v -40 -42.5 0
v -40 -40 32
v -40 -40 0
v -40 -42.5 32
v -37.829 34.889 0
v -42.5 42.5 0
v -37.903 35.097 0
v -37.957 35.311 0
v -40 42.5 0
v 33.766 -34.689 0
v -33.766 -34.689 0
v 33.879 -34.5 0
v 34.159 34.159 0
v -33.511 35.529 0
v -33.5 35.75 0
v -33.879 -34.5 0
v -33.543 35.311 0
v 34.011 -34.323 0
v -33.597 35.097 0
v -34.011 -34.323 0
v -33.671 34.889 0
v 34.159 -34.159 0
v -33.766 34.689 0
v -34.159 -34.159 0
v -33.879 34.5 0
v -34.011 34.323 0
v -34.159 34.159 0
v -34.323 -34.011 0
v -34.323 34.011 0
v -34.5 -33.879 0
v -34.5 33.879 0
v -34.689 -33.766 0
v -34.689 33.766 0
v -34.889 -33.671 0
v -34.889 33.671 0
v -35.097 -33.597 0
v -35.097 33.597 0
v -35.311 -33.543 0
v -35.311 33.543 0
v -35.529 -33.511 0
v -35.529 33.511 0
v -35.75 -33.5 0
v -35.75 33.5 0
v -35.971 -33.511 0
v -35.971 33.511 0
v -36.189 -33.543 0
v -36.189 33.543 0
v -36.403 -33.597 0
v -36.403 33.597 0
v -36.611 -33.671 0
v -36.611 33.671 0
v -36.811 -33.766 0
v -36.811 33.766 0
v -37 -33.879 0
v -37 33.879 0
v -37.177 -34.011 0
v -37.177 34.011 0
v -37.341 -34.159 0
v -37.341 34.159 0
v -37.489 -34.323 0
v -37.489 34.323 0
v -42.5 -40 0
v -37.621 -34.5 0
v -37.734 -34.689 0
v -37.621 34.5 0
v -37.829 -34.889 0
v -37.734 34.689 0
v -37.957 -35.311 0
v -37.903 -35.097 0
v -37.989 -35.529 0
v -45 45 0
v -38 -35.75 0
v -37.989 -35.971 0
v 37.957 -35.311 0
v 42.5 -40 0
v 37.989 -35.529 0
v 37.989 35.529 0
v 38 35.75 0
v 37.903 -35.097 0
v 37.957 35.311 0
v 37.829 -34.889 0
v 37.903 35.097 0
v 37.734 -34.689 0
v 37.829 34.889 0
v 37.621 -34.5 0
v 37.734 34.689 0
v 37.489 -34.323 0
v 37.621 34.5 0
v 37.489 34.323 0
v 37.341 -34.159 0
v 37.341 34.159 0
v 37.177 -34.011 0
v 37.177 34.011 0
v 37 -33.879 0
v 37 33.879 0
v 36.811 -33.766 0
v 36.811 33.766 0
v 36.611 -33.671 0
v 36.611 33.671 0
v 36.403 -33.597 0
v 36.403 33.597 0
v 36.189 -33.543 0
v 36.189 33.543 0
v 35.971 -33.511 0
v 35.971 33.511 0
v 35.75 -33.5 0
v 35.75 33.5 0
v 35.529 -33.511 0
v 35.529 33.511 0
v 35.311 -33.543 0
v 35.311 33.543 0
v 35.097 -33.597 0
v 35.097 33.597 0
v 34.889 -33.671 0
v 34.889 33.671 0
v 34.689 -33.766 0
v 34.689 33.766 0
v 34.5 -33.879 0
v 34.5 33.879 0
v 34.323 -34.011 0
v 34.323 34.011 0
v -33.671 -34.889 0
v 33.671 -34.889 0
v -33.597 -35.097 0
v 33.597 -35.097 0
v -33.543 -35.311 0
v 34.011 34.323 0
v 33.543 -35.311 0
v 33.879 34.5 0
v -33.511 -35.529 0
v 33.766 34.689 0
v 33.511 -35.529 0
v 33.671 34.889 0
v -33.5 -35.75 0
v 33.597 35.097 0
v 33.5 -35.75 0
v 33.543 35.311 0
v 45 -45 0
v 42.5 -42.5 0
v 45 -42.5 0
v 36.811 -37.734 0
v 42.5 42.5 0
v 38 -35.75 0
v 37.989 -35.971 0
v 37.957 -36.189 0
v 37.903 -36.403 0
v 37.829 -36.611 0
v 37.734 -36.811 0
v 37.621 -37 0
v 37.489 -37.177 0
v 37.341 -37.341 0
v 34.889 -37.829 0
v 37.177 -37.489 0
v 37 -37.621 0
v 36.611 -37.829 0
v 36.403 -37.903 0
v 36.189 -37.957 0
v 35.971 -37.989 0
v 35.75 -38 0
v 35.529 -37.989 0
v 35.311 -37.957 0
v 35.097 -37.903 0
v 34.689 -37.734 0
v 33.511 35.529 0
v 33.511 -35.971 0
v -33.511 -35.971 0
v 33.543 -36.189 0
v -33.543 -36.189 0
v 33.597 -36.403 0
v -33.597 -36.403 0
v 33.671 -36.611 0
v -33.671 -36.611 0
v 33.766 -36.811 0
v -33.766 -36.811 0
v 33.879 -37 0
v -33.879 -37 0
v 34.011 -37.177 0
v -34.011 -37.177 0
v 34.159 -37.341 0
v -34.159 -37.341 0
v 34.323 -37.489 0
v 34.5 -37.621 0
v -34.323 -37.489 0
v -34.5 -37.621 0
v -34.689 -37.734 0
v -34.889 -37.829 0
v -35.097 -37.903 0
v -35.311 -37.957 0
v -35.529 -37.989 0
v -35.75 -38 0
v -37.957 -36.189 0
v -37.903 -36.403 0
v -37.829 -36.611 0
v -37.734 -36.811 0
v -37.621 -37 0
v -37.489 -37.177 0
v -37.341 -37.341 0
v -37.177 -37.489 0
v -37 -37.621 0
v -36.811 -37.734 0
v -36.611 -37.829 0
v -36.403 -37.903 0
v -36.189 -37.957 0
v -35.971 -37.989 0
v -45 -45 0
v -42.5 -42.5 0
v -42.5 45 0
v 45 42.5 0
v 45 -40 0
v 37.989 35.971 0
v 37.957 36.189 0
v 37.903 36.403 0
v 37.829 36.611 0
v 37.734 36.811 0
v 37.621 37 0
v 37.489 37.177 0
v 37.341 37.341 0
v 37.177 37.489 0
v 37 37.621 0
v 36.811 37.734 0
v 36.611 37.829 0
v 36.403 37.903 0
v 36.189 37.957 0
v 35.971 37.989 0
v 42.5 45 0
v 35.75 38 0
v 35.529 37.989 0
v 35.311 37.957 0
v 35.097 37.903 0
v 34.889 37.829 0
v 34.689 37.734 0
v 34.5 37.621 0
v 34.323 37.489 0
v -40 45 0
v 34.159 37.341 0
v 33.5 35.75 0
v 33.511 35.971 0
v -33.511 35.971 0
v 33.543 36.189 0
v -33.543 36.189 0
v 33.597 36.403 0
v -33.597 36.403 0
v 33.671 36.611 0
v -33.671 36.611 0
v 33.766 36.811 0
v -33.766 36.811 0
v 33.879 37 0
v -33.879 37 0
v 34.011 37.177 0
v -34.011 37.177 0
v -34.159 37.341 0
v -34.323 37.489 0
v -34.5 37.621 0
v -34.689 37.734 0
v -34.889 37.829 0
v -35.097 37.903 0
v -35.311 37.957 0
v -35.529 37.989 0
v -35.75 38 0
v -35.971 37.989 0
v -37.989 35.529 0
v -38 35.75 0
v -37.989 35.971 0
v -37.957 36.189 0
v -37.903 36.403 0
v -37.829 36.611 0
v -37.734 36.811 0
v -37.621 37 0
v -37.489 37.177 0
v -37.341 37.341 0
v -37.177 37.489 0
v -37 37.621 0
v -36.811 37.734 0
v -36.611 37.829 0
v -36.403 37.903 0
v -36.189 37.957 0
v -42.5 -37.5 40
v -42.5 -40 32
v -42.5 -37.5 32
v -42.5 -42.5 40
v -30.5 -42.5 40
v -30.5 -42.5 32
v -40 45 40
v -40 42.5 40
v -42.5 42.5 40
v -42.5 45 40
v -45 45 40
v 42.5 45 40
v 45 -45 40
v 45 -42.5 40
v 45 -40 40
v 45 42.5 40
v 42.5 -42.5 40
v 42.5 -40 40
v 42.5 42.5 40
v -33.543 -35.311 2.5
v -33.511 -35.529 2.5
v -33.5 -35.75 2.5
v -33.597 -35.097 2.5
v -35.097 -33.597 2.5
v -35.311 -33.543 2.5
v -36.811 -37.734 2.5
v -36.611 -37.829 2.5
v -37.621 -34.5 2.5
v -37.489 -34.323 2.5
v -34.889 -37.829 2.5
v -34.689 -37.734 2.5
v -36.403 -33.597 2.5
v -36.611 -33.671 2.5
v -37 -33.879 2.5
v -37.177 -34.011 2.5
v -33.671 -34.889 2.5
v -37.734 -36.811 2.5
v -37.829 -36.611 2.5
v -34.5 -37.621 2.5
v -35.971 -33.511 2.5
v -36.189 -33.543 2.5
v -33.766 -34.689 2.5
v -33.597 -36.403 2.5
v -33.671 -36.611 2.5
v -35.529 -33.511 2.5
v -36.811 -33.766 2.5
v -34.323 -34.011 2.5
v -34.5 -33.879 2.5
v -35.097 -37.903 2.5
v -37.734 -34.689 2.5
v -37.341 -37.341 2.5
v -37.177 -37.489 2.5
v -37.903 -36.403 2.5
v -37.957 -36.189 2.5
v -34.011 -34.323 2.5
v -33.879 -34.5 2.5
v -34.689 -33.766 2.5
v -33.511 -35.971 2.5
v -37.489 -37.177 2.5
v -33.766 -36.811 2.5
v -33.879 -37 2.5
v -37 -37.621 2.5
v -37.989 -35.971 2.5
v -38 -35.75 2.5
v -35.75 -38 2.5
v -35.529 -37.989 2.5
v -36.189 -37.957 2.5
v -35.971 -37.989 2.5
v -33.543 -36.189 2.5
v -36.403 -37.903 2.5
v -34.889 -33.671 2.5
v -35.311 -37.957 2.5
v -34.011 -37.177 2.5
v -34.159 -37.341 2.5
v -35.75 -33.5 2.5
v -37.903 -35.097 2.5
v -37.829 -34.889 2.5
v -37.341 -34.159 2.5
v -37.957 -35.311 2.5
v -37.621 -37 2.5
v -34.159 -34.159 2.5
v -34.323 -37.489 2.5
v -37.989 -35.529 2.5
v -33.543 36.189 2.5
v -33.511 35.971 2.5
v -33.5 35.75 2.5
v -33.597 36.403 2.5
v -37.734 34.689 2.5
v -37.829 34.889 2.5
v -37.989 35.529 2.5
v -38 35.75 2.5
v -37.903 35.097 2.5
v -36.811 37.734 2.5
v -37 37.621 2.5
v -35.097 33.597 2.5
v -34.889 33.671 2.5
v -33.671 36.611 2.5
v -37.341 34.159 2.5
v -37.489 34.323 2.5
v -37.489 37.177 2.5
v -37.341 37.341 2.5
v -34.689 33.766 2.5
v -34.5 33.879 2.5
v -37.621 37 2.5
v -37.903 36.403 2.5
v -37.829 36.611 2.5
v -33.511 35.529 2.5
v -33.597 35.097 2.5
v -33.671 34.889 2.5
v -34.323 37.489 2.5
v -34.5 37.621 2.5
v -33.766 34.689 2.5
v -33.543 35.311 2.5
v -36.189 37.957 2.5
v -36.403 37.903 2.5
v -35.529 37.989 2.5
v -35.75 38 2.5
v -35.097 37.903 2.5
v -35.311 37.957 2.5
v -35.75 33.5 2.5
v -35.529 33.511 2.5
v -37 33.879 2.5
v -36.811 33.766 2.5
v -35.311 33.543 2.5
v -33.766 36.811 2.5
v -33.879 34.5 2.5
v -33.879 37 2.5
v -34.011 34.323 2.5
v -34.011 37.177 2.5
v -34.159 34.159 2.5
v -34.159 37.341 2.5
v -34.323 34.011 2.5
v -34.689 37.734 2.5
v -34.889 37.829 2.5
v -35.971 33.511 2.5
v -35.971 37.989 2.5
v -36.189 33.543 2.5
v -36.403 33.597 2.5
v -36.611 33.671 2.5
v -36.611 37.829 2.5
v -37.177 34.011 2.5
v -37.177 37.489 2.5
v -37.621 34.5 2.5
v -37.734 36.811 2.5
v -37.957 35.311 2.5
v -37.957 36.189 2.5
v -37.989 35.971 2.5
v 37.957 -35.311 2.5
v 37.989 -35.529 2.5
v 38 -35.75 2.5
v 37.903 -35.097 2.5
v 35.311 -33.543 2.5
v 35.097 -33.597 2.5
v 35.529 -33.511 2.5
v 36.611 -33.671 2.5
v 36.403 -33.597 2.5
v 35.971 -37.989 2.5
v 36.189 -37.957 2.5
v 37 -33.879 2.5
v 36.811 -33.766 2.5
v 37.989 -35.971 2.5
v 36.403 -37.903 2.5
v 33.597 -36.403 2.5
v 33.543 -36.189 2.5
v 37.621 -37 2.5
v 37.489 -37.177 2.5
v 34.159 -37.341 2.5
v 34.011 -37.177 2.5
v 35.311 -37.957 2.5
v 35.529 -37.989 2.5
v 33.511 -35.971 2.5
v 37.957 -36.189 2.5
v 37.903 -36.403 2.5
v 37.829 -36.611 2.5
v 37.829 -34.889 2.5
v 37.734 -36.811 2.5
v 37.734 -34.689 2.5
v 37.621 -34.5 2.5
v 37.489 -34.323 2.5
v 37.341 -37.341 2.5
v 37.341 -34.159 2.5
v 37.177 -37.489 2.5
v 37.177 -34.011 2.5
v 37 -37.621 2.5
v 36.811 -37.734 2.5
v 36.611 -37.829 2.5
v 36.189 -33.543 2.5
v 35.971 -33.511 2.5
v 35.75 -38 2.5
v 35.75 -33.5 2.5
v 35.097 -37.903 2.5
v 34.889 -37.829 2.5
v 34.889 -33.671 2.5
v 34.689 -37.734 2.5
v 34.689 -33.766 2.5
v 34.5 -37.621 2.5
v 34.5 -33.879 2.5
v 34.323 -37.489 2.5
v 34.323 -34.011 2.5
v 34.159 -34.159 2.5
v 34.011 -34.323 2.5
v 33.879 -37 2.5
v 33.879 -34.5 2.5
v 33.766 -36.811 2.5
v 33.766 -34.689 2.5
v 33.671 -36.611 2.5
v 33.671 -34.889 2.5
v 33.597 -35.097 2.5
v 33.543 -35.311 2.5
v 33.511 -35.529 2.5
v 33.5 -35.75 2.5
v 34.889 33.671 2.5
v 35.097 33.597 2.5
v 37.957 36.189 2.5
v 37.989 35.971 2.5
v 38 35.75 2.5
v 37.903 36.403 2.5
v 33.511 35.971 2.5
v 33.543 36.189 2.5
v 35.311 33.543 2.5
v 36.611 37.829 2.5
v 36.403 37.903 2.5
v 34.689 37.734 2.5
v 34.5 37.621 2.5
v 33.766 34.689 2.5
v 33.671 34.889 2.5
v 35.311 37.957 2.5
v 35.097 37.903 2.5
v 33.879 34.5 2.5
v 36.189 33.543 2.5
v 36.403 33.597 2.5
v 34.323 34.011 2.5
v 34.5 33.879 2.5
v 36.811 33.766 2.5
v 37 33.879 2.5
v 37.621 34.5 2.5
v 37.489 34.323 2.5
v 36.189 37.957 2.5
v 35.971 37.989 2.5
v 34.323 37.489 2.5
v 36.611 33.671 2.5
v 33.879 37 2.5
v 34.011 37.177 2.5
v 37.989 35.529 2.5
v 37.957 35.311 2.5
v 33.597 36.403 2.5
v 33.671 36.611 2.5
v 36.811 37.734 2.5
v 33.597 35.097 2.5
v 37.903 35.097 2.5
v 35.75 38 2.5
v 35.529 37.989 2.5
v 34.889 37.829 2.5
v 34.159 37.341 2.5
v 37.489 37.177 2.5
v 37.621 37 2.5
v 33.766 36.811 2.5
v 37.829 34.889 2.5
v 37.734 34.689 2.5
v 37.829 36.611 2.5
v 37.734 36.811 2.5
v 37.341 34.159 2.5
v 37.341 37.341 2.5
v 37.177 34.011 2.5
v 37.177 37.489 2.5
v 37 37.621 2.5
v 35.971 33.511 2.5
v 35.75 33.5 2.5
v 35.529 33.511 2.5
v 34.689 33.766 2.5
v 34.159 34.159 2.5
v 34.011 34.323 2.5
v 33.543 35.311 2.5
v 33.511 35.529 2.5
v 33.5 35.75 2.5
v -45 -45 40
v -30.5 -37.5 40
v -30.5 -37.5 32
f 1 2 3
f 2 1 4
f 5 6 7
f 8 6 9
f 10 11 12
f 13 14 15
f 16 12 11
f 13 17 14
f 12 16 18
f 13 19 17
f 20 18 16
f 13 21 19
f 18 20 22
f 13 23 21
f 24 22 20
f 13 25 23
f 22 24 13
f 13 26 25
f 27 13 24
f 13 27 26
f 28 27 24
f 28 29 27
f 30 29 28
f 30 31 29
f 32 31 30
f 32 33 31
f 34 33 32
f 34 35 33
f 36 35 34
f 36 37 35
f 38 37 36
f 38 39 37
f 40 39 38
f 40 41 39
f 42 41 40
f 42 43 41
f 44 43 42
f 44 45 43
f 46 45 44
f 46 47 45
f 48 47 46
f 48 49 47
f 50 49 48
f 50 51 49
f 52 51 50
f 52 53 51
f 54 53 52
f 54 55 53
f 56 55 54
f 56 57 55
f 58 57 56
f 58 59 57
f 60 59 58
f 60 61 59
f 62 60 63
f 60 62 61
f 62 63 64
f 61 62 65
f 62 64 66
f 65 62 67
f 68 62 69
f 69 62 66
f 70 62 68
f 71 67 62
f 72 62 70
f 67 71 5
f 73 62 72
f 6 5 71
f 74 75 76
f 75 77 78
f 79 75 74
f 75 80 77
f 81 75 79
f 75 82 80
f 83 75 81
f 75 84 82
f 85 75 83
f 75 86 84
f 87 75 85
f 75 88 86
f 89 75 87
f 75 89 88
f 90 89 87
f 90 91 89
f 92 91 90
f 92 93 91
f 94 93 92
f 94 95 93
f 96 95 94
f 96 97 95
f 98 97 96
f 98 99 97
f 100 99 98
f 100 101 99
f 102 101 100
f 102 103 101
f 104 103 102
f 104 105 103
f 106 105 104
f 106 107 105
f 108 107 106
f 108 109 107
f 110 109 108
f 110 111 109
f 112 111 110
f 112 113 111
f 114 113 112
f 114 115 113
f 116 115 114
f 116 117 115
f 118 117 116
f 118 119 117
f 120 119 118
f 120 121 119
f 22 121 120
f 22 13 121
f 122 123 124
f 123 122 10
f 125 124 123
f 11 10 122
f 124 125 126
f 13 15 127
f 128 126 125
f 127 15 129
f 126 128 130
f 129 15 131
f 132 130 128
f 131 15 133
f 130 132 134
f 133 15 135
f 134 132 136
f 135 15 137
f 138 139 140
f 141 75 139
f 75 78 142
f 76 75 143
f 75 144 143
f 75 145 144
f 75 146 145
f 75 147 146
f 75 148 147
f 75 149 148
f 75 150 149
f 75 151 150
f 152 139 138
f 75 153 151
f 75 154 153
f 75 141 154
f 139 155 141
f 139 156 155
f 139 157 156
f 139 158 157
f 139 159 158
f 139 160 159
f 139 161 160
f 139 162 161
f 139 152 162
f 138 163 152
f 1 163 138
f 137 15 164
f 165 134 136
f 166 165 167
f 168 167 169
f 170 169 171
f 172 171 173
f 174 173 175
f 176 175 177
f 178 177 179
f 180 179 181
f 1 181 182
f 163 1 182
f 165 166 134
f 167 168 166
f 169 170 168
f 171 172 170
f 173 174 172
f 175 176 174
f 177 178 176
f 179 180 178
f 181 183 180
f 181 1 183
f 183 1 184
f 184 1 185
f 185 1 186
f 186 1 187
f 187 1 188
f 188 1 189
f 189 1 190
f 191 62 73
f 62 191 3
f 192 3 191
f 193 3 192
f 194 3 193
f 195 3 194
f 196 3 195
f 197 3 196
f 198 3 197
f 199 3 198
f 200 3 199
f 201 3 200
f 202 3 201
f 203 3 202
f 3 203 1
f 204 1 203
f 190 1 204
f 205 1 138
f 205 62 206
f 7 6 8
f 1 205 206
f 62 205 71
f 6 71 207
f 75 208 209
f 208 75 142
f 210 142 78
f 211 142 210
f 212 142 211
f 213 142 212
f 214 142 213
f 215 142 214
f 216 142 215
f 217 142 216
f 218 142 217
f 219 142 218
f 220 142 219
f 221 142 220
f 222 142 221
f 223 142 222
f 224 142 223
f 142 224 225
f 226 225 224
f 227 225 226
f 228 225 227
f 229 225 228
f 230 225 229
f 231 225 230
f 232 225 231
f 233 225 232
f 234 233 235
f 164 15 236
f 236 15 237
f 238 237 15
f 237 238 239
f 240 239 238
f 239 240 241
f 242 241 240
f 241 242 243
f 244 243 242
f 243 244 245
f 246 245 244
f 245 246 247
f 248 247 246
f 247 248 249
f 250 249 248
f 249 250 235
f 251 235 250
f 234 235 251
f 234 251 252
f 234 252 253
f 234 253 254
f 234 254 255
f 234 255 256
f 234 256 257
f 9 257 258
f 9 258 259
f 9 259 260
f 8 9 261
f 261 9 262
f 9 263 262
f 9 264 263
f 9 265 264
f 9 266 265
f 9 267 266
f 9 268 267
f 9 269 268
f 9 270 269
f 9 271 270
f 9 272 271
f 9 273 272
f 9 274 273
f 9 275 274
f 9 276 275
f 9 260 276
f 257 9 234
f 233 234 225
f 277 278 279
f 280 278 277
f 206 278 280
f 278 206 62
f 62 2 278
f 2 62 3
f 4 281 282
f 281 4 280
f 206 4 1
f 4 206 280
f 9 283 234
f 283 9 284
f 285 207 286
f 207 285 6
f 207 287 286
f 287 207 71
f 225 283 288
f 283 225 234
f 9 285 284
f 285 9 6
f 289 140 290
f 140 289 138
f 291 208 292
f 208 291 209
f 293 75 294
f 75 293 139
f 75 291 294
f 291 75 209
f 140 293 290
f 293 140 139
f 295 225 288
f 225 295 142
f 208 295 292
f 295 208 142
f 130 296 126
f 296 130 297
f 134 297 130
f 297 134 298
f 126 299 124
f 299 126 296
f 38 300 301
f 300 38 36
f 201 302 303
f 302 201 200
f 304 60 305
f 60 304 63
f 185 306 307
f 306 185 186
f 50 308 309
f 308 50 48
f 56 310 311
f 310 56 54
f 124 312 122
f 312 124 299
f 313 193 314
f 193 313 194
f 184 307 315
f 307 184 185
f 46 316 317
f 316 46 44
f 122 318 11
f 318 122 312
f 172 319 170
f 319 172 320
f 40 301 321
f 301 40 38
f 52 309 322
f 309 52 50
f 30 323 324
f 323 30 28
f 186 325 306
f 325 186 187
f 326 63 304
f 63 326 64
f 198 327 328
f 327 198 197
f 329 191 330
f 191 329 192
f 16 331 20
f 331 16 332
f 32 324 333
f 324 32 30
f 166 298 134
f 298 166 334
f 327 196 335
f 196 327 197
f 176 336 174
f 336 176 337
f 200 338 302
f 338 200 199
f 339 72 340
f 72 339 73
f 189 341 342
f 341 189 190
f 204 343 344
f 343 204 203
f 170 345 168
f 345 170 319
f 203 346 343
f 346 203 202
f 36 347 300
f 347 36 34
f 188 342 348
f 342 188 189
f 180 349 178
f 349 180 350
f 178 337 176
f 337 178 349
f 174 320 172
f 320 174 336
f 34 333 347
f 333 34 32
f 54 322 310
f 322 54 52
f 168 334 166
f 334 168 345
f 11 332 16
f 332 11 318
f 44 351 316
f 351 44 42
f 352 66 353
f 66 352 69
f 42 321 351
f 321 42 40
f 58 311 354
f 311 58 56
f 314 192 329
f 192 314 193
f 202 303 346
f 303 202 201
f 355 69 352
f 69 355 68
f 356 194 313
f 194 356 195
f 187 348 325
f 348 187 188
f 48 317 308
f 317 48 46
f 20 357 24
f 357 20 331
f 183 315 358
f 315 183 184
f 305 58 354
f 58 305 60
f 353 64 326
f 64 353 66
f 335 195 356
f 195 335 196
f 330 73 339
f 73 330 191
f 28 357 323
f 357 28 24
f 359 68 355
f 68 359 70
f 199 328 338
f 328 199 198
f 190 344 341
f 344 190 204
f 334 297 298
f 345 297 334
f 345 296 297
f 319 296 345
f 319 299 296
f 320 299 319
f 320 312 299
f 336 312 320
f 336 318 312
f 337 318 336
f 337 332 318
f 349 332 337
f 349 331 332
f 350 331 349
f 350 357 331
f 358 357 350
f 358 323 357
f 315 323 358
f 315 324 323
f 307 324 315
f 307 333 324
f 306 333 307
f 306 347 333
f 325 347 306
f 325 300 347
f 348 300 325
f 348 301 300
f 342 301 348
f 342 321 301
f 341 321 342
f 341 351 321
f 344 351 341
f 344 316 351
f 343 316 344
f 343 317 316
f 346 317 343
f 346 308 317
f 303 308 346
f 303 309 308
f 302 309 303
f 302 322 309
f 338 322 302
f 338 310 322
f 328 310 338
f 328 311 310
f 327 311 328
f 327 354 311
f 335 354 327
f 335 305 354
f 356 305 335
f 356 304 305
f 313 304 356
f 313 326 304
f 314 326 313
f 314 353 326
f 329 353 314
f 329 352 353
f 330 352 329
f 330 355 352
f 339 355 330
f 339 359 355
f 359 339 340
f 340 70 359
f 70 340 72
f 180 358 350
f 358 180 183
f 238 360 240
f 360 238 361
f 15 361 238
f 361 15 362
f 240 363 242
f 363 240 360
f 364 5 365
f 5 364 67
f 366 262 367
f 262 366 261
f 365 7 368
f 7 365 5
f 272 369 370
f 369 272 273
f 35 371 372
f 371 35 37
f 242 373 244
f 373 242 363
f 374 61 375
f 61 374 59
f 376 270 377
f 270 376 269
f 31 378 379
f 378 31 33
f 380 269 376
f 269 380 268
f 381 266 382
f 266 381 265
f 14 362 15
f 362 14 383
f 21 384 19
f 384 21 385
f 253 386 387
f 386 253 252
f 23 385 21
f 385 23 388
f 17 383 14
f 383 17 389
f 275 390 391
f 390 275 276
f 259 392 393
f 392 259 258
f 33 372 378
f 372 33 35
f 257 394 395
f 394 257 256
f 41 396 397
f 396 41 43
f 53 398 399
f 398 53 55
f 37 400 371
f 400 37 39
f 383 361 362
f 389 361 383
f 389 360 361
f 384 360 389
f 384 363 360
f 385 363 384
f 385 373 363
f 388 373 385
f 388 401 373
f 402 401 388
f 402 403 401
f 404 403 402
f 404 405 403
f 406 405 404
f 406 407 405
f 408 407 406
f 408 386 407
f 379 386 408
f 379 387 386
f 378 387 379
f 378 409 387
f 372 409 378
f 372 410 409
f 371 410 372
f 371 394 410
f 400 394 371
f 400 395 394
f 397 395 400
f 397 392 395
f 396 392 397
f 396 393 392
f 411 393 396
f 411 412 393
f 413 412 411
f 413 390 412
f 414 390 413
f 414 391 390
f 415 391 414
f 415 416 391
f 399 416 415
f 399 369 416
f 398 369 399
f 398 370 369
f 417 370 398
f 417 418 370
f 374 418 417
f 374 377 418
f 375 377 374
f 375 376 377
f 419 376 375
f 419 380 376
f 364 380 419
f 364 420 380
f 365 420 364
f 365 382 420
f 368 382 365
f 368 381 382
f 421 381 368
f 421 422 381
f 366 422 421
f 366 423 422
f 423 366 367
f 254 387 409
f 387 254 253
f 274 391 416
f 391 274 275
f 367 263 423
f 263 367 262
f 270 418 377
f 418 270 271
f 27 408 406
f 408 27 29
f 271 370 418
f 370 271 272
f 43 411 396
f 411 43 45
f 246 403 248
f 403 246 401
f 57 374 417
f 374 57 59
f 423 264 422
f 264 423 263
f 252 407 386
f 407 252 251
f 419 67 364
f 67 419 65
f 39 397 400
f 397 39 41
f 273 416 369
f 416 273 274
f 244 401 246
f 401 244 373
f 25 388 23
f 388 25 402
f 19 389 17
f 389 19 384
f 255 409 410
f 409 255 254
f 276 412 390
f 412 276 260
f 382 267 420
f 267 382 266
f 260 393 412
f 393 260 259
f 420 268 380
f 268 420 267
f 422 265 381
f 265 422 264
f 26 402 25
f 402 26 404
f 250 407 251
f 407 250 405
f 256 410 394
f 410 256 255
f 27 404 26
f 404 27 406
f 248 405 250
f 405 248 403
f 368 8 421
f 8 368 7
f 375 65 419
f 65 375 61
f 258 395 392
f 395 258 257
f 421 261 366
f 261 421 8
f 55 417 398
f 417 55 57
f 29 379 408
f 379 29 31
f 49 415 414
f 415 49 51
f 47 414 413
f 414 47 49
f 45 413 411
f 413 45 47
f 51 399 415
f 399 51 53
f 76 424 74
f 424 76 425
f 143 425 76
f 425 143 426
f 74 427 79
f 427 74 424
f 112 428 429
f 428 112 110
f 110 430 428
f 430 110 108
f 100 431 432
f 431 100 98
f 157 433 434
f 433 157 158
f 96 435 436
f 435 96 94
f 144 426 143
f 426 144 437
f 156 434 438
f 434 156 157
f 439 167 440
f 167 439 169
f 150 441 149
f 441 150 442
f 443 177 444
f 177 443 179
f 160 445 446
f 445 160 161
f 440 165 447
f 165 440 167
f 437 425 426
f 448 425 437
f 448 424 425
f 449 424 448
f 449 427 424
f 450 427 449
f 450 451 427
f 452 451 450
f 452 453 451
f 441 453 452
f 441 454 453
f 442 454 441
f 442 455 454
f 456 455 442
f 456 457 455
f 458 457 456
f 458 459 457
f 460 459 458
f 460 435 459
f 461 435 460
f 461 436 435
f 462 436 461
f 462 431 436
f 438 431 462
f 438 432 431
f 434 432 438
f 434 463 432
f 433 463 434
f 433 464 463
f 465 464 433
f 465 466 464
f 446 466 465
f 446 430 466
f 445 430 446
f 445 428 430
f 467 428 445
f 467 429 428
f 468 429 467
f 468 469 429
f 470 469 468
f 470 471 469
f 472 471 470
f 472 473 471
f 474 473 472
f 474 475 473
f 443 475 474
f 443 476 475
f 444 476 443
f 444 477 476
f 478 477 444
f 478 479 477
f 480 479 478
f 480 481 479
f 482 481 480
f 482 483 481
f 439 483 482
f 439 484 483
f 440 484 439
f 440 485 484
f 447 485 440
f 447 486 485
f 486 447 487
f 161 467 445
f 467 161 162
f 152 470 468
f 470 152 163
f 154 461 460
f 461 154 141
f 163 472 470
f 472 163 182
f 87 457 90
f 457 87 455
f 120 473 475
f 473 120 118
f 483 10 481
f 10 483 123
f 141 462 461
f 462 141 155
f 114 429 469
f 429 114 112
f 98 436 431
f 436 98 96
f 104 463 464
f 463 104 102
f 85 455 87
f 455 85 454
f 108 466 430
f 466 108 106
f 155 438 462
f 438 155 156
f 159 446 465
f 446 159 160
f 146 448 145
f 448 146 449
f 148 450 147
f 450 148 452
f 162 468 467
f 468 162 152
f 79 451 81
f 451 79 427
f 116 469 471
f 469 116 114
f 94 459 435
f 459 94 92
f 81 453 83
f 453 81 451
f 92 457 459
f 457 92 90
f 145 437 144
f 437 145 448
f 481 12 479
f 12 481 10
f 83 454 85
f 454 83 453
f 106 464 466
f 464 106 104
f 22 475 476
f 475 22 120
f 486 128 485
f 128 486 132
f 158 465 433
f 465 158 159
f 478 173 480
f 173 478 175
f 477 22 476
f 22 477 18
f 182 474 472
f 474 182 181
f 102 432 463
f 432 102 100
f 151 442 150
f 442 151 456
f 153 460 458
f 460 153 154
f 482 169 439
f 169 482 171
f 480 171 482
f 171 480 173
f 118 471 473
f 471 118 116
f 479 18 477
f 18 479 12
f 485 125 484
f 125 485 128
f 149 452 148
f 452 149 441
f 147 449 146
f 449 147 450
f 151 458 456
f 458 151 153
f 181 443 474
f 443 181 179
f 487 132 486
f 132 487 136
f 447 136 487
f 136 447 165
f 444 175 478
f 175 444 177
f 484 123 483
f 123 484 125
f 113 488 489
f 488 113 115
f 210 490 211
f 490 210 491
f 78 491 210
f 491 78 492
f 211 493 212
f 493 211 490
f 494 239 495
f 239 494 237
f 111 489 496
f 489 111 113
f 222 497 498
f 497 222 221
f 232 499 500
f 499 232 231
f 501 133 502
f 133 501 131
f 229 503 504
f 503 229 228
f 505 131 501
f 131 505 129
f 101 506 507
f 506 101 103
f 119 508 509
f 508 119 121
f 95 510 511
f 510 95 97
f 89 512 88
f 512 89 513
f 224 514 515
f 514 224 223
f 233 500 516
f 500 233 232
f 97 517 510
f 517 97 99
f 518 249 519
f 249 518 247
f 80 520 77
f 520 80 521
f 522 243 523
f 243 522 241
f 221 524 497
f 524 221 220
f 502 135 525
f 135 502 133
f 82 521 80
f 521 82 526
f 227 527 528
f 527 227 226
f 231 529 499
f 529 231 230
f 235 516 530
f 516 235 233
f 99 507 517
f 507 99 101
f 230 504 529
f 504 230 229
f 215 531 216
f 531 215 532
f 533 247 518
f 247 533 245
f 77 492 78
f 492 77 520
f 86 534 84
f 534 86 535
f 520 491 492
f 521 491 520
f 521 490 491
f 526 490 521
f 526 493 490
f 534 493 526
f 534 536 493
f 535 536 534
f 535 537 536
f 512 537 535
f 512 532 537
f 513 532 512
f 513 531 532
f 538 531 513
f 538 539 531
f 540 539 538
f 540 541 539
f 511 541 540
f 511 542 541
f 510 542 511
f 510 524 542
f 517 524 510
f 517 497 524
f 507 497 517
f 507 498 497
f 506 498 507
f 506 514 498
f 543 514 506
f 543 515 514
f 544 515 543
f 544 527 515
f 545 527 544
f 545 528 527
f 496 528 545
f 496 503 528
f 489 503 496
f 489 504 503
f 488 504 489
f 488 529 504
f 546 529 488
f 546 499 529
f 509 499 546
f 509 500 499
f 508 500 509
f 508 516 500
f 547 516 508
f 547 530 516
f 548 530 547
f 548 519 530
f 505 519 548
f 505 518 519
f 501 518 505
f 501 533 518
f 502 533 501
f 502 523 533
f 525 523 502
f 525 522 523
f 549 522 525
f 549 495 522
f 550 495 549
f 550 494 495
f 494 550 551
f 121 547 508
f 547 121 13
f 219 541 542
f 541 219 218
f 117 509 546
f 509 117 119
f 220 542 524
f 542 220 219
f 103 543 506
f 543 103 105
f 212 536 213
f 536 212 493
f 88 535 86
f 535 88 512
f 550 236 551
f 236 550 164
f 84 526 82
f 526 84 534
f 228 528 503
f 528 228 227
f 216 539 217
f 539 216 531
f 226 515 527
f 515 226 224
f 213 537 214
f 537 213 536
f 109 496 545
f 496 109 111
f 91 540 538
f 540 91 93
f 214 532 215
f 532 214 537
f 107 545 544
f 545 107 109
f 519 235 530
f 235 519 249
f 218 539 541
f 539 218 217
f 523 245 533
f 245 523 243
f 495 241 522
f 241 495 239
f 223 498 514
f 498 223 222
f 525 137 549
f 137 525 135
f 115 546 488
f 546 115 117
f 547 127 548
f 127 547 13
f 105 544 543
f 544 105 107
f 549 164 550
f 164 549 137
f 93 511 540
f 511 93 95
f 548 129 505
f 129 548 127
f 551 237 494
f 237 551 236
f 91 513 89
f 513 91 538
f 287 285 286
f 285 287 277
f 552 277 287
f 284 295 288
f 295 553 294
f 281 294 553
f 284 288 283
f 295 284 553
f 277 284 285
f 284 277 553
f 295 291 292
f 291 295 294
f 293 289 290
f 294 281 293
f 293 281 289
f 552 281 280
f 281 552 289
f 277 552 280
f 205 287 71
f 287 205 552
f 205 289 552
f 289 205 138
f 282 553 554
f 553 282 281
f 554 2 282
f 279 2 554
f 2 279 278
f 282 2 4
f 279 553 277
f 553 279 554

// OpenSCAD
// DIY magnetic stirrer housing for an 80 mm PC case fan
// Print orientation: upside-down open box, top plate on the bed

// ---- Dimensions (mm) ----
box_outer_x   = 90;    // outer size in X
box_outer_y   = 90;    // outer size in Y
top_plate_t   = 2;     // top plate thickness (z = 0 to 2)
wall_t        = 2.5;   // wall thickness (z = 2 to 40)
open_top_z    = 40;    // open top of box
screw_hole_d  = 4.5;   // M4 screw holes
screw_pitch   = 71.5;  // square pattern diagonal
notch_w       = 12;    // power cable notch width
notch_depth   = 8;     // notch depth from open edge (z = 32 to 40)
eps           = 0.5;   // cutter overshoot past faces

$fn = 64;

// ---- Model ----
difference() {
    // Solid box: top plate + four walls, open at the top
    translate([-box_outer_x/2, -box_outer_y/2, 0])
        cube([box_outer_x, box_outer_y, open_top_z]);

    // Four through-cut walls, leaving the top open
    for (dx = [-box_outer_x/2 + wall_t, box_outer_x/2 - wall_t],
         dy = [-box_outer_y/2 + wall_t, box_outer_y/2 - wall_t])
        translate([dx, dy, 0])
            cube([wall_t, wall_t, open_top_z + eps]);

    // Four M4 screw holes in the top plate on a 71.5 mm square pattern
    for (x = [-screw_pitch/2, screw_pitch/2], y = [-screw_pitch/2, screw_pitch/2])
        translate([x, y, -eps])
            cylinder(d = screw_hole_d, h = top_plate_t + 2*eps);

    // Notch in one wall for the power cable, centred along the wall
    translate([-box_outer_x/2 + wall_t, -box_outer_y/2 + wall_t, open_top_z - notch_depth])
        cube([notch_w, box_outer_y - 2*(box_outer_y/2 - wall_t), notch_depth + eps]);
}
